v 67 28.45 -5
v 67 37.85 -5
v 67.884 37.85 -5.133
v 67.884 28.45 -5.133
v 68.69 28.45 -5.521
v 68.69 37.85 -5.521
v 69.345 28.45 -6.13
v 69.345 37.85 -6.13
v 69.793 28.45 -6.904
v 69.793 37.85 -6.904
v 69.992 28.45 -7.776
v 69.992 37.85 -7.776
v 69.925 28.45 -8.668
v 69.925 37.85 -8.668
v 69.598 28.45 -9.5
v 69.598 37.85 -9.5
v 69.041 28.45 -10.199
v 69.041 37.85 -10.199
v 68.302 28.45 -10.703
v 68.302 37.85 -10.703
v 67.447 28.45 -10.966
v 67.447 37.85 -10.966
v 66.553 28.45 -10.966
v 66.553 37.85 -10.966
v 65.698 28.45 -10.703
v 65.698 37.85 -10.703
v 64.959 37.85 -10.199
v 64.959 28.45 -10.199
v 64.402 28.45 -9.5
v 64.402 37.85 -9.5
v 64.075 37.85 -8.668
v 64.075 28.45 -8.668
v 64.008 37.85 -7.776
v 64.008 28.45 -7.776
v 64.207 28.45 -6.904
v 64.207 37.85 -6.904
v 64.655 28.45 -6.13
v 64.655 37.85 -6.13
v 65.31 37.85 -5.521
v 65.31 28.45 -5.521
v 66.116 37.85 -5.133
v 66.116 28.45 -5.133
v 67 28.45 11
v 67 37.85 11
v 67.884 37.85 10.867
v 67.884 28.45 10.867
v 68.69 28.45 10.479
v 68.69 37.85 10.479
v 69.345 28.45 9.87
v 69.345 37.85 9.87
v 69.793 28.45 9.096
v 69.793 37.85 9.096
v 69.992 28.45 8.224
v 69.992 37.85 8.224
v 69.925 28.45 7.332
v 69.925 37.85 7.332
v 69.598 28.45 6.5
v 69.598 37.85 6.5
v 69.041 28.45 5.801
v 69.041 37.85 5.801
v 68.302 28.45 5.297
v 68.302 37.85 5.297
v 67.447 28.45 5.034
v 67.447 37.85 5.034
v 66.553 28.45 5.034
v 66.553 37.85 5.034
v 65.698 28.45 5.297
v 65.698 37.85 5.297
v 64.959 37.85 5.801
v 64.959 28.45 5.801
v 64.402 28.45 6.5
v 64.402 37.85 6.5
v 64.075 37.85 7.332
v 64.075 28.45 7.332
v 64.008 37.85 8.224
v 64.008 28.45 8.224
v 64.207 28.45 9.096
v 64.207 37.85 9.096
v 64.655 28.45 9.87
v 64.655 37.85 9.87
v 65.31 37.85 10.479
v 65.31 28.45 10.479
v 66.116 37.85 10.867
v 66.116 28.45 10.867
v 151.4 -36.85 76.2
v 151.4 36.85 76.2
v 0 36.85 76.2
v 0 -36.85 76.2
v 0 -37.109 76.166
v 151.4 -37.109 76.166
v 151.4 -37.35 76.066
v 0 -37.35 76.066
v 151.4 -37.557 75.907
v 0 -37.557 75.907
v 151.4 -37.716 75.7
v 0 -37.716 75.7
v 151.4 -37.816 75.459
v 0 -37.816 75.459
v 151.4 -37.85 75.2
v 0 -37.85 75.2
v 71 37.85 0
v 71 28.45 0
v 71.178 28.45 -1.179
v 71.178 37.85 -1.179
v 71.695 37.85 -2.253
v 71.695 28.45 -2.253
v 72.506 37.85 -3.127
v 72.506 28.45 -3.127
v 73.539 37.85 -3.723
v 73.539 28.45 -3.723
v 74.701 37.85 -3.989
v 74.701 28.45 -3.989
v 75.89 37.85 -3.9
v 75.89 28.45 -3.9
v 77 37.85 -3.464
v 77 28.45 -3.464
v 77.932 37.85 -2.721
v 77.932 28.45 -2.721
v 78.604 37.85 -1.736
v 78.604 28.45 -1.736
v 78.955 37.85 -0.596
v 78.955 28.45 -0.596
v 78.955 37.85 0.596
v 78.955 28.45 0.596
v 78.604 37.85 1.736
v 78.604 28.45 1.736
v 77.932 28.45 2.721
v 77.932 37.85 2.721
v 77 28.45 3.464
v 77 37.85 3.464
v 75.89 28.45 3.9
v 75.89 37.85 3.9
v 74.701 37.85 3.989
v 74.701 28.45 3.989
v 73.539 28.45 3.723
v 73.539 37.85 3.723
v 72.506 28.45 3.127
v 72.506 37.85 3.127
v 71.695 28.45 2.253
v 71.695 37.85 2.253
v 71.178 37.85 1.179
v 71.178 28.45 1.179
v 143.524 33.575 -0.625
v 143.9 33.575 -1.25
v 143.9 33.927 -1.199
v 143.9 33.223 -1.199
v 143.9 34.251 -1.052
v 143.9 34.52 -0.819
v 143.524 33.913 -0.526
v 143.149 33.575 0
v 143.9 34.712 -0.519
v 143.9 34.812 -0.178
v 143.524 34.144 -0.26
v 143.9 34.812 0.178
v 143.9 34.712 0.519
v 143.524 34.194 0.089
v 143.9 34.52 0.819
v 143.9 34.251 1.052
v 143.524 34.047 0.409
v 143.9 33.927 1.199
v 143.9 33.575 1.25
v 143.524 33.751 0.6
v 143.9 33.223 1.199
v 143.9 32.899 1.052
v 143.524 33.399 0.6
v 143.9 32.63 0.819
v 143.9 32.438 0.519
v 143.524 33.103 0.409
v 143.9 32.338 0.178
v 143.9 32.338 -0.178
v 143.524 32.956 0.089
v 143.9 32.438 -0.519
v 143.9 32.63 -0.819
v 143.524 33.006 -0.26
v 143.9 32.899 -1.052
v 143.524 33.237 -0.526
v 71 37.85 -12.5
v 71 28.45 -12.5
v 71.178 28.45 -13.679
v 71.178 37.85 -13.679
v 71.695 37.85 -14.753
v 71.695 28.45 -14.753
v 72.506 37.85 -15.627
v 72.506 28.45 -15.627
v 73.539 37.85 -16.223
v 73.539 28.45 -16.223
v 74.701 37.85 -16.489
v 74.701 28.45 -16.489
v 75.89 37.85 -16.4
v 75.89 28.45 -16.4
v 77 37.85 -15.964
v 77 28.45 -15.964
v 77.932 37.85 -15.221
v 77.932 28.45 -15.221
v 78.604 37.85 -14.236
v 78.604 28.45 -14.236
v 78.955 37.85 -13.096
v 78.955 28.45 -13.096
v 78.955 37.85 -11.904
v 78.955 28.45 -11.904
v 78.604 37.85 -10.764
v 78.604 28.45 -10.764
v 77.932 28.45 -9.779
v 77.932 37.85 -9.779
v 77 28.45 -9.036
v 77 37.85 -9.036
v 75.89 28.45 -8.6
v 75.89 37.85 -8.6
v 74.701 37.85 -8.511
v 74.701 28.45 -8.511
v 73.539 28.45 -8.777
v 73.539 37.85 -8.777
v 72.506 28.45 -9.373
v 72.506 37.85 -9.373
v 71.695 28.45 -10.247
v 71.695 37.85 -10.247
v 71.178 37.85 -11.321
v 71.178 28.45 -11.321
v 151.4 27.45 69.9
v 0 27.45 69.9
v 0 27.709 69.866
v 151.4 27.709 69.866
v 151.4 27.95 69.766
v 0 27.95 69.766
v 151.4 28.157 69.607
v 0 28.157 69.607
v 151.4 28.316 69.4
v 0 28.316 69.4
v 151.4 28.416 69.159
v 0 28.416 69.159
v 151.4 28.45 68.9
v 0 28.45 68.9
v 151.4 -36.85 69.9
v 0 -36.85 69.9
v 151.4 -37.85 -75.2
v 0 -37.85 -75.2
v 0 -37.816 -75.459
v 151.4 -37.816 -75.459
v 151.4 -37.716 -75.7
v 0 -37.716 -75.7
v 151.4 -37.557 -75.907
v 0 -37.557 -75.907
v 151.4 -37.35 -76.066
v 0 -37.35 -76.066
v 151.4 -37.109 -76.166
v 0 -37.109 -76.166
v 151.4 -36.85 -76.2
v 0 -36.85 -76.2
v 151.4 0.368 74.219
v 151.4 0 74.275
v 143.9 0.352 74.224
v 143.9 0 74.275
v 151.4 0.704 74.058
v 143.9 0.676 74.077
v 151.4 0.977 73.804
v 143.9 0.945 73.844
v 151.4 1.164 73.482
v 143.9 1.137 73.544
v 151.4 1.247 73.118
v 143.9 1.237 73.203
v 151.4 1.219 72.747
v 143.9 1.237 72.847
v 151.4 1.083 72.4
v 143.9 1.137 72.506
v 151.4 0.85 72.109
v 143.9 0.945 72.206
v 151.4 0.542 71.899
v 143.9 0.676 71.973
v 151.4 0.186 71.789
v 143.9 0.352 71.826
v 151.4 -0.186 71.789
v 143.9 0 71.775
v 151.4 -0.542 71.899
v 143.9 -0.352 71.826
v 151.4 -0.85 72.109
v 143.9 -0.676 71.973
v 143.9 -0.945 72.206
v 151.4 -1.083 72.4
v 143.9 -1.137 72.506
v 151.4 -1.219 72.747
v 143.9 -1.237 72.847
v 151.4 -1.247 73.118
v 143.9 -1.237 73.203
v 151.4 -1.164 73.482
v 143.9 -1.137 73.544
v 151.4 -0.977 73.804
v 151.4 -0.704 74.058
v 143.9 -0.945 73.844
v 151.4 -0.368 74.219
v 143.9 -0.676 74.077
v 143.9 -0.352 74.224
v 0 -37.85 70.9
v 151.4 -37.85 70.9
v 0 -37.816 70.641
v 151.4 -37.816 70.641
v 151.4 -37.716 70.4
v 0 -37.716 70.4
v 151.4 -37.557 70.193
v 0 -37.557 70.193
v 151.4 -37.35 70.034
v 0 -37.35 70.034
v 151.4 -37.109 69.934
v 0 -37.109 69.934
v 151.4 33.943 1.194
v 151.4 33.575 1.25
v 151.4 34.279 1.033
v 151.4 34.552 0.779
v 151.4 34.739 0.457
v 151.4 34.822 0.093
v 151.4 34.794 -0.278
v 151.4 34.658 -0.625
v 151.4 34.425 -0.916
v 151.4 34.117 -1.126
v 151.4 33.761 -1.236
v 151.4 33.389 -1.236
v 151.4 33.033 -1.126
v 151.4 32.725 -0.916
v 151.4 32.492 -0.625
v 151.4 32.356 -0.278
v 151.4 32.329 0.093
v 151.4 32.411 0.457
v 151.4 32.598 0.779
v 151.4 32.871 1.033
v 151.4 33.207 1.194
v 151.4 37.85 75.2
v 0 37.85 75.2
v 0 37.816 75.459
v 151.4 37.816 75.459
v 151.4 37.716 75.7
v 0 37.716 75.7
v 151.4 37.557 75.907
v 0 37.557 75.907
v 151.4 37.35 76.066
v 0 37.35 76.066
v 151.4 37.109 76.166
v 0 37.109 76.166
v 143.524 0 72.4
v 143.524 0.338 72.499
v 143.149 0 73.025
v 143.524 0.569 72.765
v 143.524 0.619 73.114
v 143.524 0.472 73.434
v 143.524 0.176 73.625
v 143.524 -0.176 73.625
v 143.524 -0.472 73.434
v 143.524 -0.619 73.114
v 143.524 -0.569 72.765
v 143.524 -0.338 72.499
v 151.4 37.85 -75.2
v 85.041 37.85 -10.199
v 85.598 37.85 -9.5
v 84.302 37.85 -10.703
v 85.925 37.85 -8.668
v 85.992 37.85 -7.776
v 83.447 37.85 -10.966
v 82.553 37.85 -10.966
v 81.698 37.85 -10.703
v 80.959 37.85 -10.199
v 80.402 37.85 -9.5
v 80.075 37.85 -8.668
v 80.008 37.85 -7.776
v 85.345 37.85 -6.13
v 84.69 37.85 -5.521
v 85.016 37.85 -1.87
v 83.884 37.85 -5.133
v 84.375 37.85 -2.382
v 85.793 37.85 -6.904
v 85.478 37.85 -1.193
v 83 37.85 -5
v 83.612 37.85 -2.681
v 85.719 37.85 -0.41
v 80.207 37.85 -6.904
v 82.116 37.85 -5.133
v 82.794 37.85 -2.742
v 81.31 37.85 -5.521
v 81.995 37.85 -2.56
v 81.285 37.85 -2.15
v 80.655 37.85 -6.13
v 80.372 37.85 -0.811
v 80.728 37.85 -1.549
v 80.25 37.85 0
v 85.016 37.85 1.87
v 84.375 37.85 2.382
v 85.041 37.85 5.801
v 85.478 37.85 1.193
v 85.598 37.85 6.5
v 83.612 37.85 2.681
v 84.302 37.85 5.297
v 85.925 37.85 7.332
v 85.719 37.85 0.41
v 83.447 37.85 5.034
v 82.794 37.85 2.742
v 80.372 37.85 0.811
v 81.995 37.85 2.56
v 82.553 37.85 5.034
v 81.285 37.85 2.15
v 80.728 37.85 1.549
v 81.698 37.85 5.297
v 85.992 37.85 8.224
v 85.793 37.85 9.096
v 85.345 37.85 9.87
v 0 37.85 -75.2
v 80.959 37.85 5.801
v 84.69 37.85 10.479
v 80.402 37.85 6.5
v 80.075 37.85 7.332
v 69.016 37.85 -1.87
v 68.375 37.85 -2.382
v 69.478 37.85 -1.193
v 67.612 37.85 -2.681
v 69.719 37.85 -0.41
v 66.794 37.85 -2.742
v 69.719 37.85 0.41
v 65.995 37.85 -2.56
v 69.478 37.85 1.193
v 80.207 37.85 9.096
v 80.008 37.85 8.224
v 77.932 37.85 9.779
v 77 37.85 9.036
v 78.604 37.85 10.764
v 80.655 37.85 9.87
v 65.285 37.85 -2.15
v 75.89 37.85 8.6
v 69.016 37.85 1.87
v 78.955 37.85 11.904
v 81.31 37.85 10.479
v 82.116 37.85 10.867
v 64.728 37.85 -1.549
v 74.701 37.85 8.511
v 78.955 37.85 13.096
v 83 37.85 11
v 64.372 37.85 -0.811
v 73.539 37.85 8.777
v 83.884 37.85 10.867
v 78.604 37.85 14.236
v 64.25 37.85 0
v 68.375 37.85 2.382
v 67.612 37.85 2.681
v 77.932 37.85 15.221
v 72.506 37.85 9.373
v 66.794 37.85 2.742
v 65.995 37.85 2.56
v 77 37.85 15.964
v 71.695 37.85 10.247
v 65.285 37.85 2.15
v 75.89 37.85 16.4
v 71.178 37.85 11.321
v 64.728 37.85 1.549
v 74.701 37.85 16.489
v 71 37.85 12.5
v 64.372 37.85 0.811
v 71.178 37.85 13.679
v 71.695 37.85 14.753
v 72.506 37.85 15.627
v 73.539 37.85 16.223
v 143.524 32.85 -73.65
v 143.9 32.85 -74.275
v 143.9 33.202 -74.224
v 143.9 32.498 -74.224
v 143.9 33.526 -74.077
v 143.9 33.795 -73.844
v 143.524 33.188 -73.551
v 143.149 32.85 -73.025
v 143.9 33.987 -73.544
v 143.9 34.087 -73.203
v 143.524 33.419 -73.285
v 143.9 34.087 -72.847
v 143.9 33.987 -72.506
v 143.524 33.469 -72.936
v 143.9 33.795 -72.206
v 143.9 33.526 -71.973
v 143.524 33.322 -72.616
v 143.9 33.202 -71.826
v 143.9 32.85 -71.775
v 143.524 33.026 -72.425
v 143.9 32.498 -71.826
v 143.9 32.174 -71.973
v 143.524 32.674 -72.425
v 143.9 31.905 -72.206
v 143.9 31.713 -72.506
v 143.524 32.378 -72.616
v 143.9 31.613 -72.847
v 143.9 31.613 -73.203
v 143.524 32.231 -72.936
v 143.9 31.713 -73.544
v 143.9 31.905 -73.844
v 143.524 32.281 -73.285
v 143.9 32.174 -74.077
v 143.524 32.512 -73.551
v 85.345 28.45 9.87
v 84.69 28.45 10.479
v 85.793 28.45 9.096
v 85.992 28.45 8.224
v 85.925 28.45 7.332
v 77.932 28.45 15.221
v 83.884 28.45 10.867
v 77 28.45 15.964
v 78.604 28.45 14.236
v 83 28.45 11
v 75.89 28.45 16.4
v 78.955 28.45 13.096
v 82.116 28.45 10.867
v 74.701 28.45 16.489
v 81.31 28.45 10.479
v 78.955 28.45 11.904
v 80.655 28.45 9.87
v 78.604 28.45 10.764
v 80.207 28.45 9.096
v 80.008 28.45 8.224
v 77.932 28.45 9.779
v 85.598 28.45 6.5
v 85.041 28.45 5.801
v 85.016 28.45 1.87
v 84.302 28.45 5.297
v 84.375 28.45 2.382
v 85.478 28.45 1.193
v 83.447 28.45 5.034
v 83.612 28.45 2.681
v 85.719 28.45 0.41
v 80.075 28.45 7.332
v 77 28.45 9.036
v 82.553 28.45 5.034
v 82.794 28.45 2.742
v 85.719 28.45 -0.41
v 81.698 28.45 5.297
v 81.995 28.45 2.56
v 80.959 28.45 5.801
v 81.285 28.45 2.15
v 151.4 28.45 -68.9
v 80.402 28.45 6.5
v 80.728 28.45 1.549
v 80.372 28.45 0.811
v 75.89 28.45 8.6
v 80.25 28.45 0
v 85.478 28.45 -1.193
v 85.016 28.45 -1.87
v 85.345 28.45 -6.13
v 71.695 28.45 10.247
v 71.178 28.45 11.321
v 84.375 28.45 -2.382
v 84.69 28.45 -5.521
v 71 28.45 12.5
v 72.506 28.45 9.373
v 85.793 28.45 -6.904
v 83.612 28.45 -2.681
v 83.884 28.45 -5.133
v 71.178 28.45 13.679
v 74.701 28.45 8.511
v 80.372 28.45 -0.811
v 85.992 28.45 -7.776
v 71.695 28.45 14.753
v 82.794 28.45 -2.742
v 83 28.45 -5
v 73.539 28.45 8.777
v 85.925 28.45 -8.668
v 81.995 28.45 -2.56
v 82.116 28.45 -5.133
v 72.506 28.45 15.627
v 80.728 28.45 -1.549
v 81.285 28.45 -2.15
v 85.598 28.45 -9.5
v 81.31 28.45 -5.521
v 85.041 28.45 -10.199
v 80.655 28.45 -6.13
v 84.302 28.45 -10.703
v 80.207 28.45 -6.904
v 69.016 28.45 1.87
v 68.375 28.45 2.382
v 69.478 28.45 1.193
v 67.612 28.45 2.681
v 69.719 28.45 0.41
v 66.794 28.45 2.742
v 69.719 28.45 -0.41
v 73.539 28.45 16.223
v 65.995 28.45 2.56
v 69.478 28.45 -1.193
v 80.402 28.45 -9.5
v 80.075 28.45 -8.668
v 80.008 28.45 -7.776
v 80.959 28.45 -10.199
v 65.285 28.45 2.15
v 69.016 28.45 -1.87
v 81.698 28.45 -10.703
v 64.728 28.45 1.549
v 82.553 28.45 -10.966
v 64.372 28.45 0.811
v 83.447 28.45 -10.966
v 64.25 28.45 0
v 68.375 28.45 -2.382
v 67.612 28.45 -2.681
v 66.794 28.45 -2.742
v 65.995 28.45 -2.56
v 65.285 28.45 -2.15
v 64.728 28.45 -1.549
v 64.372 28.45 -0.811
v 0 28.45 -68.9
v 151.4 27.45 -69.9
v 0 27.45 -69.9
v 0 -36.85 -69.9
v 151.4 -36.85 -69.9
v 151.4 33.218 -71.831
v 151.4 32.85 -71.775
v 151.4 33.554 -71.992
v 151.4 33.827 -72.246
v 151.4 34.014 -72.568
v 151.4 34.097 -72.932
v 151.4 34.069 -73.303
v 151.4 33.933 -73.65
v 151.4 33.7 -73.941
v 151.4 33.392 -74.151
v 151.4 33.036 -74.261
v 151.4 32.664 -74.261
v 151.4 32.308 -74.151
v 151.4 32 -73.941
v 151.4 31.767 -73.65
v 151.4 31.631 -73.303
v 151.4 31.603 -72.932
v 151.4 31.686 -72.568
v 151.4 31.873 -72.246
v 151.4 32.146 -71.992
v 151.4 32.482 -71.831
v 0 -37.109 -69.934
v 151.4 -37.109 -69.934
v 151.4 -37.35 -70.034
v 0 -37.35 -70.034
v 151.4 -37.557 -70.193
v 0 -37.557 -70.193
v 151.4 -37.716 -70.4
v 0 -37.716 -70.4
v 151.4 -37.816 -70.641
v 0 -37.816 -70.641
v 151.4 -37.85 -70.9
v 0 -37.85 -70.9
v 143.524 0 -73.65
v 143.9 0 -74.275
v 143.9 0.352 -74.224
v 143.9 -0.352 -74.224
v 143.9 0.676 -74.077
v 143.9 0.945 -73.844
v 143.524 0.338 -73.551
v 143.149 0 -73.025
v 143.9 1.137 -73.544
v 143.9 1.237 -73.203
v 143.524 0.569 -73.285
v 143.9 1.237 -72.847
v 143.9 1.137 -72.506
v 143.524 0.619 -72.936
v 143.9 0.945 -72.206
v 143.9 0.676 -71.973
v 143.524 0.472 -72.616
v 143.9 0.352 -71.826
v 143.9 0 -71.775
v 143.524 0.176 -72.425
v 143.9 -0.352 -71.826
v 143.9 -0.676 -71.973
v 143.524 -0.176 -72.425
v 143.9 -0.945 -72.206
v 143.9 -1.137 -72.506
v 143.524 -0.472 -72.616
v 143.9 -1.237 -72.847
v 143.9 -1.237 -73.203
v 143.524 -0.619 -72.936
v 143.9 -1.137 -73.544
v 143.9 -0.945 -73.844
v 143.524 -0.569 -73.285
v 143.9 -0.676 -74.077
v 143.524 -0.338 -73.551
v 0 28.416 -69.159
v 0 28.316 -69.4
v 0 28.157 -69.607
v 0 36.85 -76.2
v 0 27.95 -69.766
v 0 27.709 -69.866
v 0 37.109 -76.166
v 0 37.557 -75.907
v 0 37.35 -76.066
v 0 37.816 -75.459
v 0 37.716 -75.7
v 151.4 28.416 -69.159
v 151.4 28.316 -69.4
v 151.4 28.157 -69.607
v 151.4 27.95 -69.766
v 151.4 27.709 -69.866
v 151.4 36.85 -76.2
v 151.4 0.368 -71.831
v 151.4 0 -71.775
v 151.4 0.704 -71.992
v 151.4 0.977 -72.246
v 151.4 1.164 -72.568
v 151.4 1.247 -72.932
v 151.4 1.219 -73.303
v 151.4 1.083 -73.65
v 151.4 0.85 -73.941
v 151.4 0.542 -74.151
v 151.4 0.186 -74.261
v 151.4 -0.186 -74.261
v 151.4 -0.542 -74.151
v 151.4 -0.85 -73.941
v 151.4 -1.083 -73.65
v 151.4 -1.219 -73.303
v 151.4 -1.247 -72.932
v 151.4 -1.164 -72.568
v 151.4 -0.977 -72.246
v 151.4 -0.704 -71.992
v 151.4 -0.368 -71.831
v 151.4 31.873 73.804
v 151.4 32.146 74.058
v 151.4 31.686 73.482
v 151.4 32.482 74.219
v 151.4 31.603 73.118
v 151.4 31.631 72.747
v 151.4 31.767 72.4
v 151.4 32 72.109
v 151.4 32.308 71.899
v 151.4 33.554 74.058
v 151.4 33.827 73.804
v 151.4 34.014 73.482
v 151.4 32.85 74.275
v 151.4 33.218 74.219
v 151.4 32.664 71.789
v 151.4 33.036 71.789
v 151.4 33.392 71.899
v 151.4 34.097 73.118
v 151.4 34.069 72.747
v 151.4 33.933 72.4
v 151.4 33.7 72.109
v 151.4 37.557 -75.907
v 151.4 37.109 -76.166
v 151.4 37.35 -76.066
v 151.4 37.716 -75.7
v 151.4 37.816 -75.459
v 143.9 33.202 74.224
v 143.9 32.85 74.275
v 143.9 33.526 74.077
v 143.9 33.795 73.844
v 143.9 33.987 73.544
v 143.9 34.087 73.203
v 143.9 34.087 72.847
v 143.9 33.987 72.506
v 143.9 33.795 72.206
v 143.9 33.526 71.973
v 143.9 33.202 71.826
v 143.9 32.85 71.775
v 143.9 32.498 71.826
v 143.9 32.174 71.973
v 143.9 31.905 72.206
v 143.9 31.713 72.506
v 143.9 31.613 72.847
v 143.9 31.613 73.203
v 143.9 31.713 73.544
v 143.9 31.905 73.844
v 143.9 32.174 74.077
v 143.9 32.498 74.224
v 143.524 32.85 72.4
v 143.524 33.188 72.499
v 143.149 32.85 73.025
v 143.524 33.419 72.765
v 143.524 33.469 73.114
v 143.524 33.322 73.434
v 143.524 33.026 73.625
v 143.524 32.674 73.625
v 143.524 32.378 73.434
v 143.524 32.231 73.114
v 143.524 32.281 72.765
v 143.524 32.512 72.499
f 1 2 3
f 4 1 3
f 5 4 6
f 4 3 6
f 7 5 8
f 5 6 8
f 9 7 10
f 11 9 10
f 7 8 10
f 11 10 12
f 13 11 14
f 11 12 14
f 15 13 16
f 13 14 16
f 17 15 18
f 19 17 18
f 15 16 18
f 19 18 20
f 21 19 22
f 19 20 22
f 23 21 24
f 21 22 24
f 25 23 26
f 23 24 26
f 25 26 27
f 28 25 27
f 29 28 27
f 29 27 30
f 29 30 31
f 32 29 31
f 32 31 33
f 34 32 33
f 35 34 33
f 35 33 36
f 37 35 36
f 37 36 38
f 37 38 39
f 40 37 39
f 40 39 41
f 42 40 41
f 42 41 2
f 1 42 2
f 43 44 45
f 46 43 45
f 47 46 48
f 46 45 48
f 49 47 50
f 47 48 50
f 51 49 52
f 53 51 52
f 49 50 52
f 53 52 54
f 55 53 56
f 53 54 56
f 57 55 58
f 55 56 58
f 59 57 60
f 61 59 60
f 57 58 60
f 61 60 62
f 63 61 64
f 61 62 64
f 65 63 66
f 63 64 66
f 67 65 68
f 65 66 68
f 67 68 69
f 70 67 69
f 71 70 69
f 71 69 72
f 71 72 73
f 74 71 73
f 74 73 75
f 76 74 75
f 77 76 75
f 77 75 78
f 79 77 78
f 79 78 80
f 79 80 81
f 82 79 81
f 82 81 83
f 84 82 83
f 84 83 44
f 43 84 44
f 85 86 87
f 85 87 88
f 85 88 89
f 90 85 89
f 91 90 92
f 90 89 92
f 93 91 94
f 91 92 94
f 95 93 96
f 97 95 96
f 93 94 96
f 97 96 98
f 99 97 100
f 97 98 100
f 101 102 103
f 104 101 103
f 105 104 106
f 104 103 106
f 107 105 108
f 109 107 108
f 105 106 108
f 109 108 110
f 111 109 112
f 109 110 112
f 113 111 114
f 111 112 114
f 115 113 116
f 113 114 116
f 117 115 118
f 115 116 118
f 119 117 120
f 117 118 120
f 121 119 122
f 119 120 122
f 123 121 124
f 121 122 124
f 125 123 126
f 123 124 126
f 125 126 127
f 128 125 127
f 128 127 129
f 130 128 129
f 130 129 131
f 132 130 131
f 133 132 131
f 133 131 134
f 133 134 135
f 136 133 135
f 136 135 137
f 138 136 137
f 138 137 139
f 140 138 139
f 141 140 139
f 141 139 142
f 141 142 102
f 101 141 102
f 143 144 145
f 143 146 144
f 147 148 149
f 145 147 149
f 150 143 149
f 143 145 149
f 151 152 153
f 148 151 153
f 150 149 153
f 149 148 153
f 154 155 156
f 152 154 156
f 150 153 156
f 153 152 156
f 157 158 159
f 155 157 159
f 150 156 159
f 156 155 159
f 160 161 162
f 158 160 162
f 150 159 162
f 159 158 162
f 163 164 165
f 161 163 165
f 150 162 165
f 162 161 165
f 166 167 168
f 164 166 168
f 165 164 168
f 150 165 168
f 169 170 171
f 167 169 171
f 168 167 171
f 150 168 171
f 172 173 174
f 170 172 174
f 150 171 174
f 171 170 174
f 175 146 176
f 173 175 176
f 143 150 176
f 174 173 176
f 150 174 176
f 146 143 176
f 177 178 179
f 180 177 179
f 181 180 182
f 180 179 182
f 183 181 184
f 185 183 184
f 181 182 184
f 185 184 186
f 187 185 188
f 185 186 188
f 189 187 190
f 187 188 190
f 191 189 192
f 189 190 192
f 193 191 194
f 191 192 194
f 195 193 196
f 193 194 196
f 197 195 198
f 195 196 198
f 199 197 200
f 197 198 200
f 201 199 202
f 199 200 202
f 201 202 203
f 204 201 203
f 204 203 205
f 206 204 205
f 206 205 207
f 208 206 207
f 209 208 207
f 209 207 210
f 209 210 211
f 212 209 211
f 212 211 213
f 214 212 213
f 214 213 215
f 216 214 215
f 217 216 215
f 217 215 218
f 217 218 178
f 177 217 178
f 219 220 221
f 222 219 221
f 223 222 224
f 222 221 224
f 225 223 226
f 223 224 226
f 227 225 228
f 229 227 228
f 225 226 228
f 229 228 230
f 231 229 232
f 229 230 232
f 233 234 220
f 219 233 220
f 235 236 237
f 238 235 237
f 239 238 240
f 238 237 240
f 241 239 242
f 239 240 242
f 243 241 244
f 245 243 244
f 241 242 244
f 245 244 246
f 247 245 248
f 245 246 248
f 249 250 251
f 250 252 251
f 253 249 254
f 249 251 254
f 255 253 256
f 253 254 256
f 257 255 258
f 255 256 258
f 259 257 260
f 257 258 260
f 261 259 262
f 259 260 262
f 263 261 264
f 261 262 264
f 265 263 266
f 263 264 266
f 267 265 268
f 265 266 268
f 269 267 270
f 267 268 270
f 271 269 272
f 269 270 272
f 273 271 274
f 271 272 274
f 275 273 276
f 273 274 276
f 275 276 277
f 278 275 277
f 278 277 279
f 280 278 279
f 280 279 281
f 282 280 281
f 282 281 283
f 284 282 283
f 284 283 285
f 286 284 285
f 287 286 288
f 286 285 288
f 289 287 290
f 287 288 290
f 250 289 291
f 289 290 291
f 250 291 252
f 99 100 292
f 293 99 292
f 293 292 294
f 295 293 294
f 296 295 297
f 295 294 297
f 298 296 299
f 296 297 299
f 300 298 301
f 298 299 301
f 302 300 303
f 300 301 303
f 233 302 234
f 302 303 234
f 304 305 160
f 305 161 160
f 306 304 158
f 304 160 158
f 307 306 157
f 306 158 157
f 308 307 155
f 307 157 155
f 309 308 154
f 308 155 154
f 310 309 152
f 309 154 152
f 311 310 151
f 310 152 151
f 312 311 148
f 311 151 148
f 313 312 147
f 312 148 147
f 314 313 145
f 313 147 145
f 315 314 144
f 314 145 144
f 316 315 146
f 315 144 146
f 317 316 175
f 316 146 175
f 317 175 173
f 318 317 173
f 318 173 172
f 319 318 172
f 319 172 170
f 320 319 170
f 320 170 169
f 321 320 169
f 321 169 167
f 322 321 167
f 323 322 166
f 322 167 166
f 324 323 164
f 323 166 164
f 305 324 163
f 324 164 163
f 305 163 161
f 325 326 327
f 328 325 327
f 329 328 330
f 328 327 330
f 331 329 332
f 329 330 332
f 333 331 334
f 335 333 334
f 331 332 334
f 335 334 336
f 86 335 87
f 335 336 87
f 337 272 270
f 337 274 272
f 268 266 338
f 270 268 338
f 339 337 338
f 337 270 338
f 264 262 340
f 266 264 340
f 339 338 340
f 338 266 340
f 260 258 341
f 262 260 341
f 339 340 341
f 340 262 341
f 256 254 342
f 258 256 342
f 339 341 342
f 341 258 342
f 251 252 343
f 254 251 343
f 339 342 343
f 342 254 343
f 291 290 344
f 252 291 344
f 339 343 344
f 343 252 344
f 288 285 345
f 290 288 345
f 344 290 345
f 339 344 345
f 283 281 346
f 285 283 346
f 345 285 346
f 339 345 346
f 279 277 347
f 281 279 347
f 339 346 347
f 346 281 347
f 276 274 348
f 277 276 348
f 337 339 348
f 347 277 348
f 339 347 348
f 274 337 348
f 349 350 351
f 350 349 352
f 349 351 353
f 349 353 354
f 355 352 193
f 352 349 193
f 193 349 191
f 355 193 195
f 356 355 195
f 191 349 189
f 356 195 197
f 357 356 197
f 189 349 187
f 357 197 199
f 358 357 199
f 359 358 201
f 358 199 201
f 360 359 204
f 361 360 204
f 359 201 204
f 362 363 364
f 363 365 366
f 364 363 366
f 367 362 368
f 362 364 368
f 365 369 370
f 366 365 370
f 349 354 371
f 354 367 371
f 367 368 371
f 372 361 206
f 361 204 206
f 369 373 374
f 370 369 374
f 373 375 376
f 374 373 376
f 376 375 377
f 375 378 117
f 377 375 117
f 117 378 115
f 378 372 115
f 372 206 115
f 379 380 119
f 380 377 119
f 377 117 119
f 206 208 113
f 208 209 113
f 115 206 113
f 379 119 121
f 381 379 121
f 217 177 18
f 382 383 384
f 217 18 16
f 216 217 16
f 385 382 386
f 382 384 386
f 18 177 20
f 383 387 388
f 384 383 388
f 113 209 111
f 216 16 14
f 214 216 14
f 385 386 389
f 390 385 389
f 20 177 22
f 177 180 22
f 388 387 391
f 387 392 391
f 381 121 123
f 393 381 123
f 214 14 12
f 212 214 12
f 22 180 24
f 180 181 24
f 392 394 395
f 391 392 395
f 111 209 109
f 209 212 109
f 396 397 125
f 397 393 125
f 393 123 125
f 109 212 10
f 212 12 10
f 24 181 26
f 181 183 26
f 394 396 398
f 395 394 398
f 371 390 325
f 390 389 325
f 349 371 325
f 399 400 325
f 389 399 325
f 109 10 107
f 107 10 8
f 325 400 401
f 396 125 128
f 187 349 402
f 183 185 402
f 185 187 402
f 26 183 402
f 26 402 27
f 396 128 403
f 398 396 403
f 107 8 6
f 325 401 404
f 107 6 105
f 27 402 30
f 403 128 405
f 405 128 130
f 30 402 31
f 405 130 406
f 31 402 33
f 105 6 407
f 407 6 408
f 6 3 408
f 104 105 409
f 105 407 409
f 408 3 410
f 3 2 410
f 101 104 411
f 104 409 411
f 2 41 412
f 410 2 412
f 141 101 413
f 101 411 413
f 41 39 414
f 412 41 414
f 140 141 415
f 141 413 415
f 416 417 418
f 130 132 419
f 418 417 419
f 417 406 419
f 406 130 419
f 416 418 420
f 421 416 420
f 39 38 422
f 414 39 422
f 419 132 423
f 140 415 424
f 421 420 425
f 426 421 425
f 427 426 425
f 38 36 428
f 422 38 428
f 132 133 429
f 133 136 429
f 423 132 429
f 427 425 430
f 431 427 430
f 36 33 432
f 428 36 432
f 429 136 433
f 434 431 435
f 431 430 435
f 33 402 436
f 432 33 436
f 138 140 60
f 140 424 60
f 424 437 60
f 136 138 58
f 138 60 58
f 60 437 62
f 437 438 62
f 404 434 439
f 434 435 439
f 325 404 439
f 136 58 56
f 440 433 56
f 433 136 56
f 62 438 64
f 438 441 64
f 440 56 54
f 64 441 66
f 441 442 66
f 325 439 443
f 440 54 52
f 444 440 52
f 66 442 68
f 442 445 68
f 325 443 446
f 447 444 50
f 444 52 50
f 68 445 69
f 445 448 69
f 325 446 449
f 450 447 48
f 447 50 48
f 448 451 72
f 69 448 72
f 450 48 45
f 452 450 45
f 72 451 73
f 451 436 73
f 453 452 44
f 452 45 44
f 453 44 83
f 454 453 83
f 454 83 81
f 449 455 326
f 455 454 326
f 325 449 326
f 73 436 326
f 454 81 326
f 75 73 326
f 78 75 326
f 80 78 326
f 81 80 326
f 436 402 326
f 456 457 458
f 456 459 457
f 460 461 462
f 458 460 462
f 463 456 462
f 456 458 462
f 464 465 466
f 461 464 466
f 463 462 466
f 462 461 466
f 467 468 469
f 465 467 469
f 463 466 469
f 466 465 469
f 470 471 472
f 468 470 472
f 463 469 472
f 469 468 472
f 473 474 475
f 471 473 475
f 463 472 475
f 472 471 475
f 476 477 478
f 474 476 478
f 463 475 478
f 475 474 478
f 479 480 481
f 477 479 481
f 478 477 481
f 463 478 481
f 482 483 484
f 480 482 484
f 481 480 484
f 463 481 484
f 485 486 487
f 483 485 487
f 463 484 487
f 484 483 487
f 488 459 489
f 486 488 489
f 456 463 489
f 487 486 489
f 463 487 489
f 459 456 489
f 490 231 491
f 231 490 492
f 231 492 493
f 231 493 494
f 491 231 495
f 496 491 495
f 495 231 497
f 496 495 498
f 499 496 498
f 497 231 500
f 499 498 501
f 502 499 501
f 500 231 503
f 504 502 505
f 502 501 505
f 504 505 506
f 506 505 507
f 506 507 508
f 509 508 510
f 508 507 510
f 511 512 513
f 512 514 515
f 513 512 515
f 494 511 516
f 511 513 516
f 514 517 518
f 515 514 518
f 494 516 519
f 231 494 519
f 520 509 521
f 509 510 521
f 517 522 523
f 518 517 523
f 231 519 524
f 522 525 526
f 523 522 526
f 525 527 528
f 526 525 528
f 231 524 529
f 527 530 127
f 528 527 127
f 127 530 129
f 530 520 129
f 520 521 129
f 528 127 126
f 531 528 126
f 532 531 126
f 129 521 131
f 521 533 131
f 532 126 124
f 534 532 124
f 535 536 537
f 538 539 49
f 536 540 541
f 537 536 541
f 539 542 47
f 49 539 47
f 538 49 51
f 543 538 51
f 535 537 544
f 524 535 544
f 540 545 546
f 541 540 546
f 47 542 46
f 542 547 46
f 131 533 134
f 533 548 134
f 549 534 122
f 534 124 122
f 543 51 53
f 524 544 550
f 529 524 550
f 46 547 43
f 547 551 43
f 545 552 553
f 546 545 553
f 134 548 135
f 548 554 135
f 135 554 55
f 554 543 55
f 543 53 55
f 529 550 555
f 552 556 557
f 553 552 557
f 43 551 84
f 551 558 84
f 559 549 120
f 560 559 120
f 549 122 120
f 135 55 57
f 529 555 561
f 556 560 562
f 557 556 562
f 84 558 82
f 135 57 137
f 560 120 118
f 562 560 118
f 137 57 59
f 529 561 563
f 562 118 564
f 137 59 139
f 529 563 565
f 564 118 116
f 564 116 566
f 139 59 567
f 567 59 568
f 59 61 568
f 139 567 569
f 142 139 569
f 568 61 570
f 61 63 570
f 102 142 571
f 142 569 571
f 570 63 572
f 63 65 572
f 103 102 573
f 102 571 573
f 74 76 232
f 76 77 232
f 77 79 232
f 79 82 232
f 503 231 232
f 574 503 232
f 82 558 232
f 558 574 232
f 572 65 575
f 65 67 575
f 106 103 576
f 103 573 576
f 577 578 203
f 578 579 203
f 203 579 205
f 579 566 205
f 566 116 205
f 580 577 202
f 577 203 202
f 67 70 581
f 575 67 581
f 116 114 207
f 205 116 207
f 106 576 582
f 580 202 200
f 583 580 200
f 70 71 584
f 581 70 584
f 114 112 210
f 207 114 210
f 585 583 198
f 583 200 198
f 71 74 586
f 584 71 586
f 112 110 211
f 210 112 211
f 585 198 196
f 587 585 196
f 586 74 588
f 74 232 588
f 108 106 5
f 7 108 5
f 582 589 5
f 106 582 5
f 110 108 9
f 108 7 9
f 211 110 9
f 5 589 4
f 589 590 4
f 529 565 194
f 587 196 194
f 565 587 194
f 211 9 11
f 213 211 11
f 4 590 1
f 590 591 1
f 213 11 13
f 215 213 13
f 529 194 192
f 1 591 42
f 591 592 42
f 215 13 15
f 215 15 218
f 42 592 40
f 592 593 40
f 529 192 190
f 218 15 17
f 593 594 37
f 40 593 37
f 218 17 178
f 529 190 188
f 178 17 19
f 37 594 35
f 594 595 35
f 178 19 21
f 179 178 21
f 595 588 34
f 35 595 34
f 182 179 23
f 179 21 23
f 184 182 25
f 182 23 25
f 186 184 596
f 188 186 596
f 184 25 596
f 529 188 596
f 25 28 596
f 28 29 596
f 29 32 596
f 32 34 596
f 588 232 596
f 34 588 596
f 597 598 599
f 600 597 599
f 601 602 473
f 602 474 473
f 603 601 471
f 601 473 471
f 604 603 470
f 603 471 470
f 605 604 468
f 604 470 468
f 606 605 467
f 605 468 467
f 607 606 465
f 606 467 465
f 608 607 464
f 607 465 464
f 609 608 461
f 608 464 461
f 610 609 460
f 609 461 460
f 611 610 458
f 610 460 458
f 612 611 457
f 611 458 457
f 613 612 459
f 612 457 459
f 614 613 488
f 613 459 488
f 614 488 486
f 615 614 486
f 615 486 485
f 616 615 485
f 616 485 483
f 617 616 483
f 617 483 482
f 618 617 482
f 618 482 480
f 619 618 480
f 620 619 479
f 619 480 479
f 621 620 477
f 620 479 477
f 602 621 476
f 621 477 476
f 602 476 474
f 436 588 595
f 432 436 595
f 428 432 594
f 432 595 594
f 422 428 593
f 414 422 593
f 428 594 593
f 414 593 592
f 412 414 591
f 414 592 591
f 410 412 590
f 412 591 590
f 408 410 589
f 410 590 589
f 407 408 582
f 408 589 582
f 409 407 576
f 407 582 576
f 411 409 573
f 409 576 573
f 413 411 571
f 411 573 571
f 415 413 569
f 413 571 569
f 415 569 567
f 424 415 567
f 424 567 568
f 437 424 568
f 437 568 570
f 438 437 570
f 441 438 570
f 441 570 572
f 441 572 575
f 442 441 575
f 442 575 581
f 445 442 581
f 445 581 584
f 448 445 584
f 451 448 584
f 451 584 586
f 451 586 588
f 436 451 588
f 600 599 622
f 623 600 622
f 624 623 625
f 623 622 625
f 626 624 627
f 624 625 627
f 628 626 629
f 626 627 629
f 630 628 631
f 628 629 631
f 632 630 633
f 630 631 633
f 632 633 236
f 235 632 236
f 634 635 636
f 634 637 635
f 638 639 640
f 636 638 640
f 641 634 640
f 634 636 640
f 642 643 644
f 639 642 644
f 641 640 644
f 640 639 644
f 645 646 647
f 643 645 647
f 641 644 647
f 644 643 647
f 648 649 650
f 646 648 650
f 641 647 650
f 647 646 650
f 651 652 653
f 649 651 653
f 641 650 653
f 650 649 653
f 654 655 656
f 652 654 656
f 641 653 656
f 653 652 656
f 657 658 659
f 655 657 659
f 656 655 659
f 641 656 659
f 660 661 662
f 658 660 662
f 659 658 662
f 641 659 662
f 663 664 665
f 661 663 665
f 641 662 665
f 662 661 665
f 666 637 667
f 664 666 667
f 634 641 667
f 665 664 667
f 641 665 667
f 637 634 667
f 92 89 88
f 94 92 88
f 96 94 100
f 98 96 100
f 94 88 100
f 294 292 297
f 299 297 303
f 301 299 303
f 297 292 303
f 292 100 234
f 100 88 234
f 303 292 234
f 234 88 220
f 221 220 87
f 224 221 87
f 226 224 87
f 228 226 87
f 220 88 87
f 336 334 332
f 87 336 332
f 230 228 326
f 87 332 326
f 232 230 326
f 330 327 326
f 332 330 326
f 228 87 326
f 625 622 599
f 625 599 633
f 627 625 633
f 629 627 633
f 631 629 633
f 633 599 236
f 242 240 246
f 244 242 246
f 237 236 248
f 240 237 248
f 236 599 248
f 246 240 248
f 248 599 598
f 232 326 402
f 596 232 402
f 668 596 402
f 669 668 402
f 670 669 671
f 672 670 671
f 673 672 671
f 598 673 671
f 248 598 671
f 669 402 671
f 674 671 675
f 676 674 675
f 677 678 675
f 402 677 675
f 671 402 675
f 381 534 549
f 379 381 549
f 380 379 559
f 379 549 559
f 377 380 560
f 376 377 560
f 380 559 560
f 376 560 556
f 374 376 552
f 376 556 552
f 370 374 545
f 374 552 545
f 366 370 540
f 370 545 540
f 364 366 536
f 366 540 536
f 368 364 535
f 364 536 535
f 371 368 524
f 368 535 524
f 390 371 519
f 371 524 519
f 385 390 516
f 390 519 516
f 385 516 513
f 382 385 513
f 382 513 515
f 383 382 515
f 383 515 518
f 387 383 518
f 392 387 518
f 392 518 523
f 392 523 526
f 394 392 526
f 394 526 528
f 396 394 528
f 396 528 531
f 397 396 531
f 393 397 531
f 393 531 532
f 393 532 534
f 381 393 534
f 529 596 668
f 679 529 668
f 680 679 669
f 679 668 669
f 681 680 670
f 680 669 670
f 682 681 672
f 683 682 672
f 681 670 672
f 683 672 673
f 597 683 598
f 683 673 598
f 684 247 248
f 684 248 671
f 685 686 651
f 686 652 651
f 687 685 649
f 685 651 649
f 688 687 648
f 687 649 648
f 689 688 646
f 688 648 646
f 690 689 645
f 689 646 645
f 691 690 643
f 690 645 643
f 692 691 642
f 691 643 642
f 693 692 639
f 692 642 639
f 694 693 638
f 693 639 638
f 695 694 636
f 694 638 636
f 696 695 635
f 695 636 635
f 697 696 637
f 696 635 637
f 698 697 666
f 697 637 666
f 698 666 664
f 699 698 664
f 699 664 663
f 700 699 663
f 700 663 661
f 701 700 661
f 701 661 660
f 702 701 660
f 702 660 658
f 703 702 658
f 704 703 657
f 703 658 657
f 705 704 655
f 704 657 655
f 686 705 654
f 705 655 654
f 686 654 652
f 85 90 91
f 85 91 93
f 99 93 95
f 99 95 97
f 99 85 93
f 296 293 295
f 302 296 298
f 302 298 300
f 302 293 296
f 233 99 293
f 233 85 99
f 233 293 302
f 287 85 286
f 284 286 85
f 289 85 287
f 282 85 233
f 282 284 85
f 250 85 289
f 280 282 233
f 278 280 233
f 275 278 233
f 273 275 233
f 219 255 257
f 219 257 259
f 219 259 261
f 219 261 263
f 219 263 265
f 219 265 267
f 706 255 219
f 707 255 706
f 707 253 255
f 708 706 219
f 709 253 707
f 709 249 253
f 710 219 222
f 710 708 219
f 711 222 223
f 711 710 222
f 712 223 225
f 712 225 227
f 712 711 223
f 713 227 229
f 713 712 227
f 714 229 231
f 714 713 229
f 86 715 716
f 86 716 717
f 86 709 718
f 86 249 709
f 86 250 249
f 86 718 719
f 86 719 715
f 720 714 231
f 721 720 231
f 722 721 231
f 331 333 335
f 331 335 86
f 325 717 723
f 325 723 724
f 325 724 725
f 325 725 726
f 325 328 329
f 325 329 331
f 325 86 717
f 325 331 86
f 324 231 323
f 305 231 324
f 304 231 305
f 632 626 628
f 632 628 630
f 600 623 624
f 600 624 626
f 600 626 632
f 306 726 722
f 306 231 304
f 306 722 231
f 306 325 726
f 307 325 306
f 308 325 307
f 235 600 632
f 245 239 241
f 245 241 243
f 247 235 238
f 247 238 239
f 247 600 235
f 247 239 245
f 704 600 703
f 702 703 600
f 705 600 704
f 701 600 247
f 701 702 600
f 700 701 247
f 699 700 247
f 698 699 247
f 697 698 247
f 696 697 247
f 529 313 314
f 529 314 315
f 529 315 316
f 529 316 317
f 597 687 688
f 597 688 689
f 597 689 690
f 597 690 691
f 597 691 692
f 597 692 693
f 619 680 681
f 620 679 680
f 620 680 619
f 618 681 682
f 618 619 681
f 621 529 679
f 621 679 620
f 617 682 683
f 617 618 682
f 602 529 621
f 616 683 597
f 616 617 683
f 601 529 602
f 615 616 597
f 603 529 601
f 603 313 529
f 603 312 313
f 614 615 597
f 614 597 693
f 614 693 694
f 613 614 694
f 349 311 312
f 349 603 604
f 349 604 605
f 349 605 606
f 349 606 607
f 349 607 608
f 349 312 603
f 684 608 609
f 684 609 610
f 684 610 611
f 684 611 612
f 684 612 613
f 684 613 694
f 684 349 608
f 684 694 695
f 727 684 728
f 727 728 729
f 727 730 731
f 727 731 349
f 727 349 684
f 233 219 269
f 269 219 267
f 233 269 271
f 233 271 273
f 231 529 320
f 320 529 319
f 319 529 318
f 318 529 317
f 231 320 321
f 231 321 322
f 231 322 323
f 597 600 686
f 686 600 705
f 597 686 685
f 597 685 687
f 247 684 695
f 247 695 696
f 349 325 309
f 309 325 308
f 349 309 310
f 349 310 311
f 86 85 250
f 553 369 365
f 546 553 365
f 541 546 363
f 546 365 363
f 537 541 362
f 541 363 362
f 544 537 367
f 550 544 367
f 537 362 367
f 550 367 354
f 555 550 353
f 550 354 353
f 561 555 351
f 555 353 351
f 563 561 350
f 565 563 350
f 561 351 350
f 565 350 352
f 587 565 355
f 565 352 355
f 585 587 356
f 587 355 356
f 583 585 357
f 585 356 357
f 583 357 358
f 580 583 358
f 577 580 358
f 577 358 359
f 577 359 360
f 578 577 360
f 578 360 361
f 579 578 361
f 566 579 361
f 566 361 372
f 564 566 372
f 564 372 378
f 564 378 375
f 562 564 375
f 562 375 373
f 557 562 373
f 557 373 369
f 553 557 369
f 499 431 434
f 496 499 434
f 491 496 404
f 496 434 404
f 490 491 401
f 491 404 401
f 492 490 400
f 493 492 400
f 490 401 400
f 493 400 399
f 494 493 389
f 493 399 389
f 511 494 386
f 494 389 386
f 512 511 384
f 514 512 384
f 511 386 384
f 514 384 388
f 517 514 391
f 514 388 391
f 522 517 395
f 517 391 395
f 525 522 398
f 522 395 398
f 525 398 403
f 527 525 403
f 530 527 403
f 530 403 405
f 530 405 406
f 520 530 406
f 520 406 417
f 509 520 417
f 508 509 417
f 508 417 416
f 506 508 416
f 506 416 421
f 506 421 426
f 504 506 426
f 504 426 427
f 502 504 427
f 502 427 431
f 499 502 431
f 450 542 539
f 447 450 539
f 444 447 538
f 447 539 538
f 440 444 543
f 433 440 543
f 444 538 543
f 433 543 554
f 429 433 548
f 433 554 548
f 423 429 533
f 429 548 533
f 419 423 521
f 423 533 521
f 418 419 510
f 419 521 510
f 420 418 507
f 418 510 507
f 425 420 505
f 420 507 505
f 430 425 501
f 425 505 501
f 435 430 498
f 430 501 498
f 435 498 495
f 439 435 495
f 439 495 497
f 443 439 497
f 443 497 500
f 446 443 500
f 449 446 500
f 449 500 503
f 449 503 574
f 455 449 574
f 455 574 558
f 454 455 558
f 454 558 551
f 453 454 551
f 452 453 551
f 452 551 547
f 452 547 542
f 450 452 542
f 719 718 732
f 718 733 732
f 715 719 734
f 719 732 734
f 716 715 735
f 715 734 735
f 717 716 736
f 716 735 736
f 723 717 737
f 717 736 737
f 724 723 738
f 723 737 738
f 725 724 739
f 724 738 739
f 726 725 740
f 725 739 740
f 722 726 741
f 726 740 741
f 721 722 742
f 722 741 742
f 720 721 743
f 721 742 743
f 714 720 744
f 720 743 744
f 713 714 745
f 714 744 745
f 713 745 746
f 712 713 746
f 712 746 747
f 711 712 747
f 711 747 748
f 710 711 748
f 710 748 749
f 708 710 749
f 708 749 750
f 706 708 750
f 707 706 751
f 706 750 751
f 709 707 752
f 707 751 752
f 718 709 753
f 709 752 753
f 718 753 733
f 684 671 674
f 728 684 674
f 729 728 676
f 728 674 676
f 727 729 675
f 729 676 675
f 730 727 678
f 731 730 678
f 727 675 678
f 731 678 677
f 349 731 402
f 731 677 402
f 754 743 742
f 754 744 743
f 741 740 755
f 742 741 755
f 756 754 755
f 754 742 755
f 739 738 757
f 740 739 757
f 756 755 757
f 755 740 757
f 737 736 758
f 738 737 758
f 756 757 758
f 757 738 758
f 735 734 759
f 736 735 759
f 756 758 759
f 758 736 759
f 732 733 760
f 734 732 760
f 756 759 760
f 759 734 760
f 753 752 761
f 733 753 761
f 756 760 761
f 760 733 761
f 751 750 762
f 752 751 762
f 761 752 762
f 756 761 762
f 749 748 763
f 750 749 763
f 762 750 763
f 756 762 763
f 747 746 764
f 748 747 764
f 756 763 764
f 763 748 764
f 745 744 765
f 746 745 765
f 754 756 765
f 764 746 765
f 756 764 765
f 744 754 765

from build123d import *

# Parameters (mm, degrees)
BOSS_EXTRUDE1_DEPTH        = 151.4
F_12_0_12_DIAMETER_HOLE1_D = 8
F_10_0_10_DIAMETER_HOLE1_D = 8
M3_TAPPED_HOLE1_D          = 2.5
M3_TAPPED_HOLE1_DEPTH      = 7.5
M3_TAPPED_HOLE1_TIP        = 0.751075774
M5_CLEARANCE_HOLE1_D       = 5.5
SKETCH19_R                 = 3
CUT_EXTRUDE3_DEPTH         = 186.631058824


with BuildPart() as part:
    # Sketch1 → Boss-Extrude1 (new body)
    with BuildSketch(Plane(origin=(0, 0, 0), x_dir=(0, 0, -1), z_dir=(1, 0, 0))):
        with BuildLine():
            Line((-69.9, -36.85), (-69.9, 27.45))
            ThreePointArc((-69.9, 27.45), (-69.607106781, 28.157106781), (-68.9, 28.45))
            Line((-68.9, 28.45), (68.9, 28.45))
            ThreePointArc((68.9, 28.45), (69.607106781, 28.157106781), (69.9, 27.45))
            Line((69.9, 27.45), (69.9, -36.85))
            ThreePointArc((69.9, -36.85), (70.192893219, -37.557106781), (70.9, -37.85))
            Line((70.9, -37.85), (75.2, -37.85))
            ThreePointArc((75.2, -37.85), (75.907106781, -37.557106781), (76.2, -36.85))
            Line((76.2, -36.85), (76.2, 36.85))
            ThreePointArc((76.2, 36.85), (75.907106781, 37.557106781), (75.2, 37.85))
            Line((75.2, 37.85), (-75.2, 37.85))
            ThreePointArc((-75.2, 37.85), (-75.907106781, 37.557106781), (-76.2, 36.85))
            Line((-76.2, 36.85), (-76.2, -36.85))
            ThreePointArc((-76.2, -36.85), (-75.907106781, -37.557106781), (-75.2, -37.85))
            Line((-75.2, -37.85), (-70.9, -37.85))
            ThreePointArc((-70.9, -37.85), (-70.192893219, -37.557106781), (-69.9, -36.85))
        make_face()
    extrude(amount=BOSS_EXTRUDE1_DEPTH)

    # Ø12.0 (12) Diameter Hole1 (through all)
    with Locations(Plane(origin=(0, 37.85, 0), x_dir=(1, 0, 0), z_dir=(0, 1, 0))):
        with Locations((75, 0)):
            Hole(F_12_0_12_DIAMETER_HOLE1_D / 2)

    # Ø10.0 (10) Diameter Hole1 (through all)
    with Locations(Plane(origin=(0, 37.85, 0), x_dir=(1, 0, 0), z_dir=(0, 1, 0))):
        with Locations((75, -12.5), (75, 0), (75, 12.5)):
            Hole(F_10_0_10_DIAMETER_HOLE1_D / 2)

    # M3 Tapped Hole1
    with Locations(Plane(origin=(151.4, 0, 0), x_dir=(0, 0, -1), z_dir=(1, 0, 0))):
        with Locations((-73.025, 0), (-73.025, 32.85), (0, 33.575019096), (73.025, 0), (73.025, 32.85)):
            Hole(M3_TAPPED_HOLE1_D / 2, depth=M3_TAPPED_HOLE1_DEPTH)
            with Locations((0, 0, -(M3_TAPPED_HOLE1_DEPTH + M3_TAPPED_HOLE1_TIP / 2))):  # 118° drill point
                Cone(0, M3_TAPPED_HOLE1_D / 2, M3_TAPPED_HOLE1_TIP, mode=Mode.SUBTRACT)

    # M5 Clearance Hole1 (through all)
    with Locations(Plane(origin=(0, 37.85, 0), x_dir=(1, 0, 0), z_dir=(0, 1, 0))):
        with Locations((83, 0), (67, 0)):
            Hole(M5_CLEARANCE_HOLE1_D / 2)

    # Sketch19 → Cut-Extrude3 (cut, through all)
    with BuildSketch(Plane(origin=(0, 37.85, 0), x_dir=(1, 0, 0), z_dir=(0, 1, 0))):
        with Locations(Location((67, 8, 0), (0, 0, 270))):
            Circle(SKETCH19_R)
        with Locations(Location((83, 8, 0), (0, 0, 270))):
            Circle(SKETCH19_R)
        with Locations(Location((83, -8, 0), (0, 0, 270))):
            Circle(SKETCH19_R)
        with Locations(Location((67, -8, 0), (0, 0, 270))):
            Circle(SKETCH19_R)
    extrude(amount=-CUT_EXTRUDE3_DEPTH, mode=Mode.SUBTRACT)


solid = part.part
